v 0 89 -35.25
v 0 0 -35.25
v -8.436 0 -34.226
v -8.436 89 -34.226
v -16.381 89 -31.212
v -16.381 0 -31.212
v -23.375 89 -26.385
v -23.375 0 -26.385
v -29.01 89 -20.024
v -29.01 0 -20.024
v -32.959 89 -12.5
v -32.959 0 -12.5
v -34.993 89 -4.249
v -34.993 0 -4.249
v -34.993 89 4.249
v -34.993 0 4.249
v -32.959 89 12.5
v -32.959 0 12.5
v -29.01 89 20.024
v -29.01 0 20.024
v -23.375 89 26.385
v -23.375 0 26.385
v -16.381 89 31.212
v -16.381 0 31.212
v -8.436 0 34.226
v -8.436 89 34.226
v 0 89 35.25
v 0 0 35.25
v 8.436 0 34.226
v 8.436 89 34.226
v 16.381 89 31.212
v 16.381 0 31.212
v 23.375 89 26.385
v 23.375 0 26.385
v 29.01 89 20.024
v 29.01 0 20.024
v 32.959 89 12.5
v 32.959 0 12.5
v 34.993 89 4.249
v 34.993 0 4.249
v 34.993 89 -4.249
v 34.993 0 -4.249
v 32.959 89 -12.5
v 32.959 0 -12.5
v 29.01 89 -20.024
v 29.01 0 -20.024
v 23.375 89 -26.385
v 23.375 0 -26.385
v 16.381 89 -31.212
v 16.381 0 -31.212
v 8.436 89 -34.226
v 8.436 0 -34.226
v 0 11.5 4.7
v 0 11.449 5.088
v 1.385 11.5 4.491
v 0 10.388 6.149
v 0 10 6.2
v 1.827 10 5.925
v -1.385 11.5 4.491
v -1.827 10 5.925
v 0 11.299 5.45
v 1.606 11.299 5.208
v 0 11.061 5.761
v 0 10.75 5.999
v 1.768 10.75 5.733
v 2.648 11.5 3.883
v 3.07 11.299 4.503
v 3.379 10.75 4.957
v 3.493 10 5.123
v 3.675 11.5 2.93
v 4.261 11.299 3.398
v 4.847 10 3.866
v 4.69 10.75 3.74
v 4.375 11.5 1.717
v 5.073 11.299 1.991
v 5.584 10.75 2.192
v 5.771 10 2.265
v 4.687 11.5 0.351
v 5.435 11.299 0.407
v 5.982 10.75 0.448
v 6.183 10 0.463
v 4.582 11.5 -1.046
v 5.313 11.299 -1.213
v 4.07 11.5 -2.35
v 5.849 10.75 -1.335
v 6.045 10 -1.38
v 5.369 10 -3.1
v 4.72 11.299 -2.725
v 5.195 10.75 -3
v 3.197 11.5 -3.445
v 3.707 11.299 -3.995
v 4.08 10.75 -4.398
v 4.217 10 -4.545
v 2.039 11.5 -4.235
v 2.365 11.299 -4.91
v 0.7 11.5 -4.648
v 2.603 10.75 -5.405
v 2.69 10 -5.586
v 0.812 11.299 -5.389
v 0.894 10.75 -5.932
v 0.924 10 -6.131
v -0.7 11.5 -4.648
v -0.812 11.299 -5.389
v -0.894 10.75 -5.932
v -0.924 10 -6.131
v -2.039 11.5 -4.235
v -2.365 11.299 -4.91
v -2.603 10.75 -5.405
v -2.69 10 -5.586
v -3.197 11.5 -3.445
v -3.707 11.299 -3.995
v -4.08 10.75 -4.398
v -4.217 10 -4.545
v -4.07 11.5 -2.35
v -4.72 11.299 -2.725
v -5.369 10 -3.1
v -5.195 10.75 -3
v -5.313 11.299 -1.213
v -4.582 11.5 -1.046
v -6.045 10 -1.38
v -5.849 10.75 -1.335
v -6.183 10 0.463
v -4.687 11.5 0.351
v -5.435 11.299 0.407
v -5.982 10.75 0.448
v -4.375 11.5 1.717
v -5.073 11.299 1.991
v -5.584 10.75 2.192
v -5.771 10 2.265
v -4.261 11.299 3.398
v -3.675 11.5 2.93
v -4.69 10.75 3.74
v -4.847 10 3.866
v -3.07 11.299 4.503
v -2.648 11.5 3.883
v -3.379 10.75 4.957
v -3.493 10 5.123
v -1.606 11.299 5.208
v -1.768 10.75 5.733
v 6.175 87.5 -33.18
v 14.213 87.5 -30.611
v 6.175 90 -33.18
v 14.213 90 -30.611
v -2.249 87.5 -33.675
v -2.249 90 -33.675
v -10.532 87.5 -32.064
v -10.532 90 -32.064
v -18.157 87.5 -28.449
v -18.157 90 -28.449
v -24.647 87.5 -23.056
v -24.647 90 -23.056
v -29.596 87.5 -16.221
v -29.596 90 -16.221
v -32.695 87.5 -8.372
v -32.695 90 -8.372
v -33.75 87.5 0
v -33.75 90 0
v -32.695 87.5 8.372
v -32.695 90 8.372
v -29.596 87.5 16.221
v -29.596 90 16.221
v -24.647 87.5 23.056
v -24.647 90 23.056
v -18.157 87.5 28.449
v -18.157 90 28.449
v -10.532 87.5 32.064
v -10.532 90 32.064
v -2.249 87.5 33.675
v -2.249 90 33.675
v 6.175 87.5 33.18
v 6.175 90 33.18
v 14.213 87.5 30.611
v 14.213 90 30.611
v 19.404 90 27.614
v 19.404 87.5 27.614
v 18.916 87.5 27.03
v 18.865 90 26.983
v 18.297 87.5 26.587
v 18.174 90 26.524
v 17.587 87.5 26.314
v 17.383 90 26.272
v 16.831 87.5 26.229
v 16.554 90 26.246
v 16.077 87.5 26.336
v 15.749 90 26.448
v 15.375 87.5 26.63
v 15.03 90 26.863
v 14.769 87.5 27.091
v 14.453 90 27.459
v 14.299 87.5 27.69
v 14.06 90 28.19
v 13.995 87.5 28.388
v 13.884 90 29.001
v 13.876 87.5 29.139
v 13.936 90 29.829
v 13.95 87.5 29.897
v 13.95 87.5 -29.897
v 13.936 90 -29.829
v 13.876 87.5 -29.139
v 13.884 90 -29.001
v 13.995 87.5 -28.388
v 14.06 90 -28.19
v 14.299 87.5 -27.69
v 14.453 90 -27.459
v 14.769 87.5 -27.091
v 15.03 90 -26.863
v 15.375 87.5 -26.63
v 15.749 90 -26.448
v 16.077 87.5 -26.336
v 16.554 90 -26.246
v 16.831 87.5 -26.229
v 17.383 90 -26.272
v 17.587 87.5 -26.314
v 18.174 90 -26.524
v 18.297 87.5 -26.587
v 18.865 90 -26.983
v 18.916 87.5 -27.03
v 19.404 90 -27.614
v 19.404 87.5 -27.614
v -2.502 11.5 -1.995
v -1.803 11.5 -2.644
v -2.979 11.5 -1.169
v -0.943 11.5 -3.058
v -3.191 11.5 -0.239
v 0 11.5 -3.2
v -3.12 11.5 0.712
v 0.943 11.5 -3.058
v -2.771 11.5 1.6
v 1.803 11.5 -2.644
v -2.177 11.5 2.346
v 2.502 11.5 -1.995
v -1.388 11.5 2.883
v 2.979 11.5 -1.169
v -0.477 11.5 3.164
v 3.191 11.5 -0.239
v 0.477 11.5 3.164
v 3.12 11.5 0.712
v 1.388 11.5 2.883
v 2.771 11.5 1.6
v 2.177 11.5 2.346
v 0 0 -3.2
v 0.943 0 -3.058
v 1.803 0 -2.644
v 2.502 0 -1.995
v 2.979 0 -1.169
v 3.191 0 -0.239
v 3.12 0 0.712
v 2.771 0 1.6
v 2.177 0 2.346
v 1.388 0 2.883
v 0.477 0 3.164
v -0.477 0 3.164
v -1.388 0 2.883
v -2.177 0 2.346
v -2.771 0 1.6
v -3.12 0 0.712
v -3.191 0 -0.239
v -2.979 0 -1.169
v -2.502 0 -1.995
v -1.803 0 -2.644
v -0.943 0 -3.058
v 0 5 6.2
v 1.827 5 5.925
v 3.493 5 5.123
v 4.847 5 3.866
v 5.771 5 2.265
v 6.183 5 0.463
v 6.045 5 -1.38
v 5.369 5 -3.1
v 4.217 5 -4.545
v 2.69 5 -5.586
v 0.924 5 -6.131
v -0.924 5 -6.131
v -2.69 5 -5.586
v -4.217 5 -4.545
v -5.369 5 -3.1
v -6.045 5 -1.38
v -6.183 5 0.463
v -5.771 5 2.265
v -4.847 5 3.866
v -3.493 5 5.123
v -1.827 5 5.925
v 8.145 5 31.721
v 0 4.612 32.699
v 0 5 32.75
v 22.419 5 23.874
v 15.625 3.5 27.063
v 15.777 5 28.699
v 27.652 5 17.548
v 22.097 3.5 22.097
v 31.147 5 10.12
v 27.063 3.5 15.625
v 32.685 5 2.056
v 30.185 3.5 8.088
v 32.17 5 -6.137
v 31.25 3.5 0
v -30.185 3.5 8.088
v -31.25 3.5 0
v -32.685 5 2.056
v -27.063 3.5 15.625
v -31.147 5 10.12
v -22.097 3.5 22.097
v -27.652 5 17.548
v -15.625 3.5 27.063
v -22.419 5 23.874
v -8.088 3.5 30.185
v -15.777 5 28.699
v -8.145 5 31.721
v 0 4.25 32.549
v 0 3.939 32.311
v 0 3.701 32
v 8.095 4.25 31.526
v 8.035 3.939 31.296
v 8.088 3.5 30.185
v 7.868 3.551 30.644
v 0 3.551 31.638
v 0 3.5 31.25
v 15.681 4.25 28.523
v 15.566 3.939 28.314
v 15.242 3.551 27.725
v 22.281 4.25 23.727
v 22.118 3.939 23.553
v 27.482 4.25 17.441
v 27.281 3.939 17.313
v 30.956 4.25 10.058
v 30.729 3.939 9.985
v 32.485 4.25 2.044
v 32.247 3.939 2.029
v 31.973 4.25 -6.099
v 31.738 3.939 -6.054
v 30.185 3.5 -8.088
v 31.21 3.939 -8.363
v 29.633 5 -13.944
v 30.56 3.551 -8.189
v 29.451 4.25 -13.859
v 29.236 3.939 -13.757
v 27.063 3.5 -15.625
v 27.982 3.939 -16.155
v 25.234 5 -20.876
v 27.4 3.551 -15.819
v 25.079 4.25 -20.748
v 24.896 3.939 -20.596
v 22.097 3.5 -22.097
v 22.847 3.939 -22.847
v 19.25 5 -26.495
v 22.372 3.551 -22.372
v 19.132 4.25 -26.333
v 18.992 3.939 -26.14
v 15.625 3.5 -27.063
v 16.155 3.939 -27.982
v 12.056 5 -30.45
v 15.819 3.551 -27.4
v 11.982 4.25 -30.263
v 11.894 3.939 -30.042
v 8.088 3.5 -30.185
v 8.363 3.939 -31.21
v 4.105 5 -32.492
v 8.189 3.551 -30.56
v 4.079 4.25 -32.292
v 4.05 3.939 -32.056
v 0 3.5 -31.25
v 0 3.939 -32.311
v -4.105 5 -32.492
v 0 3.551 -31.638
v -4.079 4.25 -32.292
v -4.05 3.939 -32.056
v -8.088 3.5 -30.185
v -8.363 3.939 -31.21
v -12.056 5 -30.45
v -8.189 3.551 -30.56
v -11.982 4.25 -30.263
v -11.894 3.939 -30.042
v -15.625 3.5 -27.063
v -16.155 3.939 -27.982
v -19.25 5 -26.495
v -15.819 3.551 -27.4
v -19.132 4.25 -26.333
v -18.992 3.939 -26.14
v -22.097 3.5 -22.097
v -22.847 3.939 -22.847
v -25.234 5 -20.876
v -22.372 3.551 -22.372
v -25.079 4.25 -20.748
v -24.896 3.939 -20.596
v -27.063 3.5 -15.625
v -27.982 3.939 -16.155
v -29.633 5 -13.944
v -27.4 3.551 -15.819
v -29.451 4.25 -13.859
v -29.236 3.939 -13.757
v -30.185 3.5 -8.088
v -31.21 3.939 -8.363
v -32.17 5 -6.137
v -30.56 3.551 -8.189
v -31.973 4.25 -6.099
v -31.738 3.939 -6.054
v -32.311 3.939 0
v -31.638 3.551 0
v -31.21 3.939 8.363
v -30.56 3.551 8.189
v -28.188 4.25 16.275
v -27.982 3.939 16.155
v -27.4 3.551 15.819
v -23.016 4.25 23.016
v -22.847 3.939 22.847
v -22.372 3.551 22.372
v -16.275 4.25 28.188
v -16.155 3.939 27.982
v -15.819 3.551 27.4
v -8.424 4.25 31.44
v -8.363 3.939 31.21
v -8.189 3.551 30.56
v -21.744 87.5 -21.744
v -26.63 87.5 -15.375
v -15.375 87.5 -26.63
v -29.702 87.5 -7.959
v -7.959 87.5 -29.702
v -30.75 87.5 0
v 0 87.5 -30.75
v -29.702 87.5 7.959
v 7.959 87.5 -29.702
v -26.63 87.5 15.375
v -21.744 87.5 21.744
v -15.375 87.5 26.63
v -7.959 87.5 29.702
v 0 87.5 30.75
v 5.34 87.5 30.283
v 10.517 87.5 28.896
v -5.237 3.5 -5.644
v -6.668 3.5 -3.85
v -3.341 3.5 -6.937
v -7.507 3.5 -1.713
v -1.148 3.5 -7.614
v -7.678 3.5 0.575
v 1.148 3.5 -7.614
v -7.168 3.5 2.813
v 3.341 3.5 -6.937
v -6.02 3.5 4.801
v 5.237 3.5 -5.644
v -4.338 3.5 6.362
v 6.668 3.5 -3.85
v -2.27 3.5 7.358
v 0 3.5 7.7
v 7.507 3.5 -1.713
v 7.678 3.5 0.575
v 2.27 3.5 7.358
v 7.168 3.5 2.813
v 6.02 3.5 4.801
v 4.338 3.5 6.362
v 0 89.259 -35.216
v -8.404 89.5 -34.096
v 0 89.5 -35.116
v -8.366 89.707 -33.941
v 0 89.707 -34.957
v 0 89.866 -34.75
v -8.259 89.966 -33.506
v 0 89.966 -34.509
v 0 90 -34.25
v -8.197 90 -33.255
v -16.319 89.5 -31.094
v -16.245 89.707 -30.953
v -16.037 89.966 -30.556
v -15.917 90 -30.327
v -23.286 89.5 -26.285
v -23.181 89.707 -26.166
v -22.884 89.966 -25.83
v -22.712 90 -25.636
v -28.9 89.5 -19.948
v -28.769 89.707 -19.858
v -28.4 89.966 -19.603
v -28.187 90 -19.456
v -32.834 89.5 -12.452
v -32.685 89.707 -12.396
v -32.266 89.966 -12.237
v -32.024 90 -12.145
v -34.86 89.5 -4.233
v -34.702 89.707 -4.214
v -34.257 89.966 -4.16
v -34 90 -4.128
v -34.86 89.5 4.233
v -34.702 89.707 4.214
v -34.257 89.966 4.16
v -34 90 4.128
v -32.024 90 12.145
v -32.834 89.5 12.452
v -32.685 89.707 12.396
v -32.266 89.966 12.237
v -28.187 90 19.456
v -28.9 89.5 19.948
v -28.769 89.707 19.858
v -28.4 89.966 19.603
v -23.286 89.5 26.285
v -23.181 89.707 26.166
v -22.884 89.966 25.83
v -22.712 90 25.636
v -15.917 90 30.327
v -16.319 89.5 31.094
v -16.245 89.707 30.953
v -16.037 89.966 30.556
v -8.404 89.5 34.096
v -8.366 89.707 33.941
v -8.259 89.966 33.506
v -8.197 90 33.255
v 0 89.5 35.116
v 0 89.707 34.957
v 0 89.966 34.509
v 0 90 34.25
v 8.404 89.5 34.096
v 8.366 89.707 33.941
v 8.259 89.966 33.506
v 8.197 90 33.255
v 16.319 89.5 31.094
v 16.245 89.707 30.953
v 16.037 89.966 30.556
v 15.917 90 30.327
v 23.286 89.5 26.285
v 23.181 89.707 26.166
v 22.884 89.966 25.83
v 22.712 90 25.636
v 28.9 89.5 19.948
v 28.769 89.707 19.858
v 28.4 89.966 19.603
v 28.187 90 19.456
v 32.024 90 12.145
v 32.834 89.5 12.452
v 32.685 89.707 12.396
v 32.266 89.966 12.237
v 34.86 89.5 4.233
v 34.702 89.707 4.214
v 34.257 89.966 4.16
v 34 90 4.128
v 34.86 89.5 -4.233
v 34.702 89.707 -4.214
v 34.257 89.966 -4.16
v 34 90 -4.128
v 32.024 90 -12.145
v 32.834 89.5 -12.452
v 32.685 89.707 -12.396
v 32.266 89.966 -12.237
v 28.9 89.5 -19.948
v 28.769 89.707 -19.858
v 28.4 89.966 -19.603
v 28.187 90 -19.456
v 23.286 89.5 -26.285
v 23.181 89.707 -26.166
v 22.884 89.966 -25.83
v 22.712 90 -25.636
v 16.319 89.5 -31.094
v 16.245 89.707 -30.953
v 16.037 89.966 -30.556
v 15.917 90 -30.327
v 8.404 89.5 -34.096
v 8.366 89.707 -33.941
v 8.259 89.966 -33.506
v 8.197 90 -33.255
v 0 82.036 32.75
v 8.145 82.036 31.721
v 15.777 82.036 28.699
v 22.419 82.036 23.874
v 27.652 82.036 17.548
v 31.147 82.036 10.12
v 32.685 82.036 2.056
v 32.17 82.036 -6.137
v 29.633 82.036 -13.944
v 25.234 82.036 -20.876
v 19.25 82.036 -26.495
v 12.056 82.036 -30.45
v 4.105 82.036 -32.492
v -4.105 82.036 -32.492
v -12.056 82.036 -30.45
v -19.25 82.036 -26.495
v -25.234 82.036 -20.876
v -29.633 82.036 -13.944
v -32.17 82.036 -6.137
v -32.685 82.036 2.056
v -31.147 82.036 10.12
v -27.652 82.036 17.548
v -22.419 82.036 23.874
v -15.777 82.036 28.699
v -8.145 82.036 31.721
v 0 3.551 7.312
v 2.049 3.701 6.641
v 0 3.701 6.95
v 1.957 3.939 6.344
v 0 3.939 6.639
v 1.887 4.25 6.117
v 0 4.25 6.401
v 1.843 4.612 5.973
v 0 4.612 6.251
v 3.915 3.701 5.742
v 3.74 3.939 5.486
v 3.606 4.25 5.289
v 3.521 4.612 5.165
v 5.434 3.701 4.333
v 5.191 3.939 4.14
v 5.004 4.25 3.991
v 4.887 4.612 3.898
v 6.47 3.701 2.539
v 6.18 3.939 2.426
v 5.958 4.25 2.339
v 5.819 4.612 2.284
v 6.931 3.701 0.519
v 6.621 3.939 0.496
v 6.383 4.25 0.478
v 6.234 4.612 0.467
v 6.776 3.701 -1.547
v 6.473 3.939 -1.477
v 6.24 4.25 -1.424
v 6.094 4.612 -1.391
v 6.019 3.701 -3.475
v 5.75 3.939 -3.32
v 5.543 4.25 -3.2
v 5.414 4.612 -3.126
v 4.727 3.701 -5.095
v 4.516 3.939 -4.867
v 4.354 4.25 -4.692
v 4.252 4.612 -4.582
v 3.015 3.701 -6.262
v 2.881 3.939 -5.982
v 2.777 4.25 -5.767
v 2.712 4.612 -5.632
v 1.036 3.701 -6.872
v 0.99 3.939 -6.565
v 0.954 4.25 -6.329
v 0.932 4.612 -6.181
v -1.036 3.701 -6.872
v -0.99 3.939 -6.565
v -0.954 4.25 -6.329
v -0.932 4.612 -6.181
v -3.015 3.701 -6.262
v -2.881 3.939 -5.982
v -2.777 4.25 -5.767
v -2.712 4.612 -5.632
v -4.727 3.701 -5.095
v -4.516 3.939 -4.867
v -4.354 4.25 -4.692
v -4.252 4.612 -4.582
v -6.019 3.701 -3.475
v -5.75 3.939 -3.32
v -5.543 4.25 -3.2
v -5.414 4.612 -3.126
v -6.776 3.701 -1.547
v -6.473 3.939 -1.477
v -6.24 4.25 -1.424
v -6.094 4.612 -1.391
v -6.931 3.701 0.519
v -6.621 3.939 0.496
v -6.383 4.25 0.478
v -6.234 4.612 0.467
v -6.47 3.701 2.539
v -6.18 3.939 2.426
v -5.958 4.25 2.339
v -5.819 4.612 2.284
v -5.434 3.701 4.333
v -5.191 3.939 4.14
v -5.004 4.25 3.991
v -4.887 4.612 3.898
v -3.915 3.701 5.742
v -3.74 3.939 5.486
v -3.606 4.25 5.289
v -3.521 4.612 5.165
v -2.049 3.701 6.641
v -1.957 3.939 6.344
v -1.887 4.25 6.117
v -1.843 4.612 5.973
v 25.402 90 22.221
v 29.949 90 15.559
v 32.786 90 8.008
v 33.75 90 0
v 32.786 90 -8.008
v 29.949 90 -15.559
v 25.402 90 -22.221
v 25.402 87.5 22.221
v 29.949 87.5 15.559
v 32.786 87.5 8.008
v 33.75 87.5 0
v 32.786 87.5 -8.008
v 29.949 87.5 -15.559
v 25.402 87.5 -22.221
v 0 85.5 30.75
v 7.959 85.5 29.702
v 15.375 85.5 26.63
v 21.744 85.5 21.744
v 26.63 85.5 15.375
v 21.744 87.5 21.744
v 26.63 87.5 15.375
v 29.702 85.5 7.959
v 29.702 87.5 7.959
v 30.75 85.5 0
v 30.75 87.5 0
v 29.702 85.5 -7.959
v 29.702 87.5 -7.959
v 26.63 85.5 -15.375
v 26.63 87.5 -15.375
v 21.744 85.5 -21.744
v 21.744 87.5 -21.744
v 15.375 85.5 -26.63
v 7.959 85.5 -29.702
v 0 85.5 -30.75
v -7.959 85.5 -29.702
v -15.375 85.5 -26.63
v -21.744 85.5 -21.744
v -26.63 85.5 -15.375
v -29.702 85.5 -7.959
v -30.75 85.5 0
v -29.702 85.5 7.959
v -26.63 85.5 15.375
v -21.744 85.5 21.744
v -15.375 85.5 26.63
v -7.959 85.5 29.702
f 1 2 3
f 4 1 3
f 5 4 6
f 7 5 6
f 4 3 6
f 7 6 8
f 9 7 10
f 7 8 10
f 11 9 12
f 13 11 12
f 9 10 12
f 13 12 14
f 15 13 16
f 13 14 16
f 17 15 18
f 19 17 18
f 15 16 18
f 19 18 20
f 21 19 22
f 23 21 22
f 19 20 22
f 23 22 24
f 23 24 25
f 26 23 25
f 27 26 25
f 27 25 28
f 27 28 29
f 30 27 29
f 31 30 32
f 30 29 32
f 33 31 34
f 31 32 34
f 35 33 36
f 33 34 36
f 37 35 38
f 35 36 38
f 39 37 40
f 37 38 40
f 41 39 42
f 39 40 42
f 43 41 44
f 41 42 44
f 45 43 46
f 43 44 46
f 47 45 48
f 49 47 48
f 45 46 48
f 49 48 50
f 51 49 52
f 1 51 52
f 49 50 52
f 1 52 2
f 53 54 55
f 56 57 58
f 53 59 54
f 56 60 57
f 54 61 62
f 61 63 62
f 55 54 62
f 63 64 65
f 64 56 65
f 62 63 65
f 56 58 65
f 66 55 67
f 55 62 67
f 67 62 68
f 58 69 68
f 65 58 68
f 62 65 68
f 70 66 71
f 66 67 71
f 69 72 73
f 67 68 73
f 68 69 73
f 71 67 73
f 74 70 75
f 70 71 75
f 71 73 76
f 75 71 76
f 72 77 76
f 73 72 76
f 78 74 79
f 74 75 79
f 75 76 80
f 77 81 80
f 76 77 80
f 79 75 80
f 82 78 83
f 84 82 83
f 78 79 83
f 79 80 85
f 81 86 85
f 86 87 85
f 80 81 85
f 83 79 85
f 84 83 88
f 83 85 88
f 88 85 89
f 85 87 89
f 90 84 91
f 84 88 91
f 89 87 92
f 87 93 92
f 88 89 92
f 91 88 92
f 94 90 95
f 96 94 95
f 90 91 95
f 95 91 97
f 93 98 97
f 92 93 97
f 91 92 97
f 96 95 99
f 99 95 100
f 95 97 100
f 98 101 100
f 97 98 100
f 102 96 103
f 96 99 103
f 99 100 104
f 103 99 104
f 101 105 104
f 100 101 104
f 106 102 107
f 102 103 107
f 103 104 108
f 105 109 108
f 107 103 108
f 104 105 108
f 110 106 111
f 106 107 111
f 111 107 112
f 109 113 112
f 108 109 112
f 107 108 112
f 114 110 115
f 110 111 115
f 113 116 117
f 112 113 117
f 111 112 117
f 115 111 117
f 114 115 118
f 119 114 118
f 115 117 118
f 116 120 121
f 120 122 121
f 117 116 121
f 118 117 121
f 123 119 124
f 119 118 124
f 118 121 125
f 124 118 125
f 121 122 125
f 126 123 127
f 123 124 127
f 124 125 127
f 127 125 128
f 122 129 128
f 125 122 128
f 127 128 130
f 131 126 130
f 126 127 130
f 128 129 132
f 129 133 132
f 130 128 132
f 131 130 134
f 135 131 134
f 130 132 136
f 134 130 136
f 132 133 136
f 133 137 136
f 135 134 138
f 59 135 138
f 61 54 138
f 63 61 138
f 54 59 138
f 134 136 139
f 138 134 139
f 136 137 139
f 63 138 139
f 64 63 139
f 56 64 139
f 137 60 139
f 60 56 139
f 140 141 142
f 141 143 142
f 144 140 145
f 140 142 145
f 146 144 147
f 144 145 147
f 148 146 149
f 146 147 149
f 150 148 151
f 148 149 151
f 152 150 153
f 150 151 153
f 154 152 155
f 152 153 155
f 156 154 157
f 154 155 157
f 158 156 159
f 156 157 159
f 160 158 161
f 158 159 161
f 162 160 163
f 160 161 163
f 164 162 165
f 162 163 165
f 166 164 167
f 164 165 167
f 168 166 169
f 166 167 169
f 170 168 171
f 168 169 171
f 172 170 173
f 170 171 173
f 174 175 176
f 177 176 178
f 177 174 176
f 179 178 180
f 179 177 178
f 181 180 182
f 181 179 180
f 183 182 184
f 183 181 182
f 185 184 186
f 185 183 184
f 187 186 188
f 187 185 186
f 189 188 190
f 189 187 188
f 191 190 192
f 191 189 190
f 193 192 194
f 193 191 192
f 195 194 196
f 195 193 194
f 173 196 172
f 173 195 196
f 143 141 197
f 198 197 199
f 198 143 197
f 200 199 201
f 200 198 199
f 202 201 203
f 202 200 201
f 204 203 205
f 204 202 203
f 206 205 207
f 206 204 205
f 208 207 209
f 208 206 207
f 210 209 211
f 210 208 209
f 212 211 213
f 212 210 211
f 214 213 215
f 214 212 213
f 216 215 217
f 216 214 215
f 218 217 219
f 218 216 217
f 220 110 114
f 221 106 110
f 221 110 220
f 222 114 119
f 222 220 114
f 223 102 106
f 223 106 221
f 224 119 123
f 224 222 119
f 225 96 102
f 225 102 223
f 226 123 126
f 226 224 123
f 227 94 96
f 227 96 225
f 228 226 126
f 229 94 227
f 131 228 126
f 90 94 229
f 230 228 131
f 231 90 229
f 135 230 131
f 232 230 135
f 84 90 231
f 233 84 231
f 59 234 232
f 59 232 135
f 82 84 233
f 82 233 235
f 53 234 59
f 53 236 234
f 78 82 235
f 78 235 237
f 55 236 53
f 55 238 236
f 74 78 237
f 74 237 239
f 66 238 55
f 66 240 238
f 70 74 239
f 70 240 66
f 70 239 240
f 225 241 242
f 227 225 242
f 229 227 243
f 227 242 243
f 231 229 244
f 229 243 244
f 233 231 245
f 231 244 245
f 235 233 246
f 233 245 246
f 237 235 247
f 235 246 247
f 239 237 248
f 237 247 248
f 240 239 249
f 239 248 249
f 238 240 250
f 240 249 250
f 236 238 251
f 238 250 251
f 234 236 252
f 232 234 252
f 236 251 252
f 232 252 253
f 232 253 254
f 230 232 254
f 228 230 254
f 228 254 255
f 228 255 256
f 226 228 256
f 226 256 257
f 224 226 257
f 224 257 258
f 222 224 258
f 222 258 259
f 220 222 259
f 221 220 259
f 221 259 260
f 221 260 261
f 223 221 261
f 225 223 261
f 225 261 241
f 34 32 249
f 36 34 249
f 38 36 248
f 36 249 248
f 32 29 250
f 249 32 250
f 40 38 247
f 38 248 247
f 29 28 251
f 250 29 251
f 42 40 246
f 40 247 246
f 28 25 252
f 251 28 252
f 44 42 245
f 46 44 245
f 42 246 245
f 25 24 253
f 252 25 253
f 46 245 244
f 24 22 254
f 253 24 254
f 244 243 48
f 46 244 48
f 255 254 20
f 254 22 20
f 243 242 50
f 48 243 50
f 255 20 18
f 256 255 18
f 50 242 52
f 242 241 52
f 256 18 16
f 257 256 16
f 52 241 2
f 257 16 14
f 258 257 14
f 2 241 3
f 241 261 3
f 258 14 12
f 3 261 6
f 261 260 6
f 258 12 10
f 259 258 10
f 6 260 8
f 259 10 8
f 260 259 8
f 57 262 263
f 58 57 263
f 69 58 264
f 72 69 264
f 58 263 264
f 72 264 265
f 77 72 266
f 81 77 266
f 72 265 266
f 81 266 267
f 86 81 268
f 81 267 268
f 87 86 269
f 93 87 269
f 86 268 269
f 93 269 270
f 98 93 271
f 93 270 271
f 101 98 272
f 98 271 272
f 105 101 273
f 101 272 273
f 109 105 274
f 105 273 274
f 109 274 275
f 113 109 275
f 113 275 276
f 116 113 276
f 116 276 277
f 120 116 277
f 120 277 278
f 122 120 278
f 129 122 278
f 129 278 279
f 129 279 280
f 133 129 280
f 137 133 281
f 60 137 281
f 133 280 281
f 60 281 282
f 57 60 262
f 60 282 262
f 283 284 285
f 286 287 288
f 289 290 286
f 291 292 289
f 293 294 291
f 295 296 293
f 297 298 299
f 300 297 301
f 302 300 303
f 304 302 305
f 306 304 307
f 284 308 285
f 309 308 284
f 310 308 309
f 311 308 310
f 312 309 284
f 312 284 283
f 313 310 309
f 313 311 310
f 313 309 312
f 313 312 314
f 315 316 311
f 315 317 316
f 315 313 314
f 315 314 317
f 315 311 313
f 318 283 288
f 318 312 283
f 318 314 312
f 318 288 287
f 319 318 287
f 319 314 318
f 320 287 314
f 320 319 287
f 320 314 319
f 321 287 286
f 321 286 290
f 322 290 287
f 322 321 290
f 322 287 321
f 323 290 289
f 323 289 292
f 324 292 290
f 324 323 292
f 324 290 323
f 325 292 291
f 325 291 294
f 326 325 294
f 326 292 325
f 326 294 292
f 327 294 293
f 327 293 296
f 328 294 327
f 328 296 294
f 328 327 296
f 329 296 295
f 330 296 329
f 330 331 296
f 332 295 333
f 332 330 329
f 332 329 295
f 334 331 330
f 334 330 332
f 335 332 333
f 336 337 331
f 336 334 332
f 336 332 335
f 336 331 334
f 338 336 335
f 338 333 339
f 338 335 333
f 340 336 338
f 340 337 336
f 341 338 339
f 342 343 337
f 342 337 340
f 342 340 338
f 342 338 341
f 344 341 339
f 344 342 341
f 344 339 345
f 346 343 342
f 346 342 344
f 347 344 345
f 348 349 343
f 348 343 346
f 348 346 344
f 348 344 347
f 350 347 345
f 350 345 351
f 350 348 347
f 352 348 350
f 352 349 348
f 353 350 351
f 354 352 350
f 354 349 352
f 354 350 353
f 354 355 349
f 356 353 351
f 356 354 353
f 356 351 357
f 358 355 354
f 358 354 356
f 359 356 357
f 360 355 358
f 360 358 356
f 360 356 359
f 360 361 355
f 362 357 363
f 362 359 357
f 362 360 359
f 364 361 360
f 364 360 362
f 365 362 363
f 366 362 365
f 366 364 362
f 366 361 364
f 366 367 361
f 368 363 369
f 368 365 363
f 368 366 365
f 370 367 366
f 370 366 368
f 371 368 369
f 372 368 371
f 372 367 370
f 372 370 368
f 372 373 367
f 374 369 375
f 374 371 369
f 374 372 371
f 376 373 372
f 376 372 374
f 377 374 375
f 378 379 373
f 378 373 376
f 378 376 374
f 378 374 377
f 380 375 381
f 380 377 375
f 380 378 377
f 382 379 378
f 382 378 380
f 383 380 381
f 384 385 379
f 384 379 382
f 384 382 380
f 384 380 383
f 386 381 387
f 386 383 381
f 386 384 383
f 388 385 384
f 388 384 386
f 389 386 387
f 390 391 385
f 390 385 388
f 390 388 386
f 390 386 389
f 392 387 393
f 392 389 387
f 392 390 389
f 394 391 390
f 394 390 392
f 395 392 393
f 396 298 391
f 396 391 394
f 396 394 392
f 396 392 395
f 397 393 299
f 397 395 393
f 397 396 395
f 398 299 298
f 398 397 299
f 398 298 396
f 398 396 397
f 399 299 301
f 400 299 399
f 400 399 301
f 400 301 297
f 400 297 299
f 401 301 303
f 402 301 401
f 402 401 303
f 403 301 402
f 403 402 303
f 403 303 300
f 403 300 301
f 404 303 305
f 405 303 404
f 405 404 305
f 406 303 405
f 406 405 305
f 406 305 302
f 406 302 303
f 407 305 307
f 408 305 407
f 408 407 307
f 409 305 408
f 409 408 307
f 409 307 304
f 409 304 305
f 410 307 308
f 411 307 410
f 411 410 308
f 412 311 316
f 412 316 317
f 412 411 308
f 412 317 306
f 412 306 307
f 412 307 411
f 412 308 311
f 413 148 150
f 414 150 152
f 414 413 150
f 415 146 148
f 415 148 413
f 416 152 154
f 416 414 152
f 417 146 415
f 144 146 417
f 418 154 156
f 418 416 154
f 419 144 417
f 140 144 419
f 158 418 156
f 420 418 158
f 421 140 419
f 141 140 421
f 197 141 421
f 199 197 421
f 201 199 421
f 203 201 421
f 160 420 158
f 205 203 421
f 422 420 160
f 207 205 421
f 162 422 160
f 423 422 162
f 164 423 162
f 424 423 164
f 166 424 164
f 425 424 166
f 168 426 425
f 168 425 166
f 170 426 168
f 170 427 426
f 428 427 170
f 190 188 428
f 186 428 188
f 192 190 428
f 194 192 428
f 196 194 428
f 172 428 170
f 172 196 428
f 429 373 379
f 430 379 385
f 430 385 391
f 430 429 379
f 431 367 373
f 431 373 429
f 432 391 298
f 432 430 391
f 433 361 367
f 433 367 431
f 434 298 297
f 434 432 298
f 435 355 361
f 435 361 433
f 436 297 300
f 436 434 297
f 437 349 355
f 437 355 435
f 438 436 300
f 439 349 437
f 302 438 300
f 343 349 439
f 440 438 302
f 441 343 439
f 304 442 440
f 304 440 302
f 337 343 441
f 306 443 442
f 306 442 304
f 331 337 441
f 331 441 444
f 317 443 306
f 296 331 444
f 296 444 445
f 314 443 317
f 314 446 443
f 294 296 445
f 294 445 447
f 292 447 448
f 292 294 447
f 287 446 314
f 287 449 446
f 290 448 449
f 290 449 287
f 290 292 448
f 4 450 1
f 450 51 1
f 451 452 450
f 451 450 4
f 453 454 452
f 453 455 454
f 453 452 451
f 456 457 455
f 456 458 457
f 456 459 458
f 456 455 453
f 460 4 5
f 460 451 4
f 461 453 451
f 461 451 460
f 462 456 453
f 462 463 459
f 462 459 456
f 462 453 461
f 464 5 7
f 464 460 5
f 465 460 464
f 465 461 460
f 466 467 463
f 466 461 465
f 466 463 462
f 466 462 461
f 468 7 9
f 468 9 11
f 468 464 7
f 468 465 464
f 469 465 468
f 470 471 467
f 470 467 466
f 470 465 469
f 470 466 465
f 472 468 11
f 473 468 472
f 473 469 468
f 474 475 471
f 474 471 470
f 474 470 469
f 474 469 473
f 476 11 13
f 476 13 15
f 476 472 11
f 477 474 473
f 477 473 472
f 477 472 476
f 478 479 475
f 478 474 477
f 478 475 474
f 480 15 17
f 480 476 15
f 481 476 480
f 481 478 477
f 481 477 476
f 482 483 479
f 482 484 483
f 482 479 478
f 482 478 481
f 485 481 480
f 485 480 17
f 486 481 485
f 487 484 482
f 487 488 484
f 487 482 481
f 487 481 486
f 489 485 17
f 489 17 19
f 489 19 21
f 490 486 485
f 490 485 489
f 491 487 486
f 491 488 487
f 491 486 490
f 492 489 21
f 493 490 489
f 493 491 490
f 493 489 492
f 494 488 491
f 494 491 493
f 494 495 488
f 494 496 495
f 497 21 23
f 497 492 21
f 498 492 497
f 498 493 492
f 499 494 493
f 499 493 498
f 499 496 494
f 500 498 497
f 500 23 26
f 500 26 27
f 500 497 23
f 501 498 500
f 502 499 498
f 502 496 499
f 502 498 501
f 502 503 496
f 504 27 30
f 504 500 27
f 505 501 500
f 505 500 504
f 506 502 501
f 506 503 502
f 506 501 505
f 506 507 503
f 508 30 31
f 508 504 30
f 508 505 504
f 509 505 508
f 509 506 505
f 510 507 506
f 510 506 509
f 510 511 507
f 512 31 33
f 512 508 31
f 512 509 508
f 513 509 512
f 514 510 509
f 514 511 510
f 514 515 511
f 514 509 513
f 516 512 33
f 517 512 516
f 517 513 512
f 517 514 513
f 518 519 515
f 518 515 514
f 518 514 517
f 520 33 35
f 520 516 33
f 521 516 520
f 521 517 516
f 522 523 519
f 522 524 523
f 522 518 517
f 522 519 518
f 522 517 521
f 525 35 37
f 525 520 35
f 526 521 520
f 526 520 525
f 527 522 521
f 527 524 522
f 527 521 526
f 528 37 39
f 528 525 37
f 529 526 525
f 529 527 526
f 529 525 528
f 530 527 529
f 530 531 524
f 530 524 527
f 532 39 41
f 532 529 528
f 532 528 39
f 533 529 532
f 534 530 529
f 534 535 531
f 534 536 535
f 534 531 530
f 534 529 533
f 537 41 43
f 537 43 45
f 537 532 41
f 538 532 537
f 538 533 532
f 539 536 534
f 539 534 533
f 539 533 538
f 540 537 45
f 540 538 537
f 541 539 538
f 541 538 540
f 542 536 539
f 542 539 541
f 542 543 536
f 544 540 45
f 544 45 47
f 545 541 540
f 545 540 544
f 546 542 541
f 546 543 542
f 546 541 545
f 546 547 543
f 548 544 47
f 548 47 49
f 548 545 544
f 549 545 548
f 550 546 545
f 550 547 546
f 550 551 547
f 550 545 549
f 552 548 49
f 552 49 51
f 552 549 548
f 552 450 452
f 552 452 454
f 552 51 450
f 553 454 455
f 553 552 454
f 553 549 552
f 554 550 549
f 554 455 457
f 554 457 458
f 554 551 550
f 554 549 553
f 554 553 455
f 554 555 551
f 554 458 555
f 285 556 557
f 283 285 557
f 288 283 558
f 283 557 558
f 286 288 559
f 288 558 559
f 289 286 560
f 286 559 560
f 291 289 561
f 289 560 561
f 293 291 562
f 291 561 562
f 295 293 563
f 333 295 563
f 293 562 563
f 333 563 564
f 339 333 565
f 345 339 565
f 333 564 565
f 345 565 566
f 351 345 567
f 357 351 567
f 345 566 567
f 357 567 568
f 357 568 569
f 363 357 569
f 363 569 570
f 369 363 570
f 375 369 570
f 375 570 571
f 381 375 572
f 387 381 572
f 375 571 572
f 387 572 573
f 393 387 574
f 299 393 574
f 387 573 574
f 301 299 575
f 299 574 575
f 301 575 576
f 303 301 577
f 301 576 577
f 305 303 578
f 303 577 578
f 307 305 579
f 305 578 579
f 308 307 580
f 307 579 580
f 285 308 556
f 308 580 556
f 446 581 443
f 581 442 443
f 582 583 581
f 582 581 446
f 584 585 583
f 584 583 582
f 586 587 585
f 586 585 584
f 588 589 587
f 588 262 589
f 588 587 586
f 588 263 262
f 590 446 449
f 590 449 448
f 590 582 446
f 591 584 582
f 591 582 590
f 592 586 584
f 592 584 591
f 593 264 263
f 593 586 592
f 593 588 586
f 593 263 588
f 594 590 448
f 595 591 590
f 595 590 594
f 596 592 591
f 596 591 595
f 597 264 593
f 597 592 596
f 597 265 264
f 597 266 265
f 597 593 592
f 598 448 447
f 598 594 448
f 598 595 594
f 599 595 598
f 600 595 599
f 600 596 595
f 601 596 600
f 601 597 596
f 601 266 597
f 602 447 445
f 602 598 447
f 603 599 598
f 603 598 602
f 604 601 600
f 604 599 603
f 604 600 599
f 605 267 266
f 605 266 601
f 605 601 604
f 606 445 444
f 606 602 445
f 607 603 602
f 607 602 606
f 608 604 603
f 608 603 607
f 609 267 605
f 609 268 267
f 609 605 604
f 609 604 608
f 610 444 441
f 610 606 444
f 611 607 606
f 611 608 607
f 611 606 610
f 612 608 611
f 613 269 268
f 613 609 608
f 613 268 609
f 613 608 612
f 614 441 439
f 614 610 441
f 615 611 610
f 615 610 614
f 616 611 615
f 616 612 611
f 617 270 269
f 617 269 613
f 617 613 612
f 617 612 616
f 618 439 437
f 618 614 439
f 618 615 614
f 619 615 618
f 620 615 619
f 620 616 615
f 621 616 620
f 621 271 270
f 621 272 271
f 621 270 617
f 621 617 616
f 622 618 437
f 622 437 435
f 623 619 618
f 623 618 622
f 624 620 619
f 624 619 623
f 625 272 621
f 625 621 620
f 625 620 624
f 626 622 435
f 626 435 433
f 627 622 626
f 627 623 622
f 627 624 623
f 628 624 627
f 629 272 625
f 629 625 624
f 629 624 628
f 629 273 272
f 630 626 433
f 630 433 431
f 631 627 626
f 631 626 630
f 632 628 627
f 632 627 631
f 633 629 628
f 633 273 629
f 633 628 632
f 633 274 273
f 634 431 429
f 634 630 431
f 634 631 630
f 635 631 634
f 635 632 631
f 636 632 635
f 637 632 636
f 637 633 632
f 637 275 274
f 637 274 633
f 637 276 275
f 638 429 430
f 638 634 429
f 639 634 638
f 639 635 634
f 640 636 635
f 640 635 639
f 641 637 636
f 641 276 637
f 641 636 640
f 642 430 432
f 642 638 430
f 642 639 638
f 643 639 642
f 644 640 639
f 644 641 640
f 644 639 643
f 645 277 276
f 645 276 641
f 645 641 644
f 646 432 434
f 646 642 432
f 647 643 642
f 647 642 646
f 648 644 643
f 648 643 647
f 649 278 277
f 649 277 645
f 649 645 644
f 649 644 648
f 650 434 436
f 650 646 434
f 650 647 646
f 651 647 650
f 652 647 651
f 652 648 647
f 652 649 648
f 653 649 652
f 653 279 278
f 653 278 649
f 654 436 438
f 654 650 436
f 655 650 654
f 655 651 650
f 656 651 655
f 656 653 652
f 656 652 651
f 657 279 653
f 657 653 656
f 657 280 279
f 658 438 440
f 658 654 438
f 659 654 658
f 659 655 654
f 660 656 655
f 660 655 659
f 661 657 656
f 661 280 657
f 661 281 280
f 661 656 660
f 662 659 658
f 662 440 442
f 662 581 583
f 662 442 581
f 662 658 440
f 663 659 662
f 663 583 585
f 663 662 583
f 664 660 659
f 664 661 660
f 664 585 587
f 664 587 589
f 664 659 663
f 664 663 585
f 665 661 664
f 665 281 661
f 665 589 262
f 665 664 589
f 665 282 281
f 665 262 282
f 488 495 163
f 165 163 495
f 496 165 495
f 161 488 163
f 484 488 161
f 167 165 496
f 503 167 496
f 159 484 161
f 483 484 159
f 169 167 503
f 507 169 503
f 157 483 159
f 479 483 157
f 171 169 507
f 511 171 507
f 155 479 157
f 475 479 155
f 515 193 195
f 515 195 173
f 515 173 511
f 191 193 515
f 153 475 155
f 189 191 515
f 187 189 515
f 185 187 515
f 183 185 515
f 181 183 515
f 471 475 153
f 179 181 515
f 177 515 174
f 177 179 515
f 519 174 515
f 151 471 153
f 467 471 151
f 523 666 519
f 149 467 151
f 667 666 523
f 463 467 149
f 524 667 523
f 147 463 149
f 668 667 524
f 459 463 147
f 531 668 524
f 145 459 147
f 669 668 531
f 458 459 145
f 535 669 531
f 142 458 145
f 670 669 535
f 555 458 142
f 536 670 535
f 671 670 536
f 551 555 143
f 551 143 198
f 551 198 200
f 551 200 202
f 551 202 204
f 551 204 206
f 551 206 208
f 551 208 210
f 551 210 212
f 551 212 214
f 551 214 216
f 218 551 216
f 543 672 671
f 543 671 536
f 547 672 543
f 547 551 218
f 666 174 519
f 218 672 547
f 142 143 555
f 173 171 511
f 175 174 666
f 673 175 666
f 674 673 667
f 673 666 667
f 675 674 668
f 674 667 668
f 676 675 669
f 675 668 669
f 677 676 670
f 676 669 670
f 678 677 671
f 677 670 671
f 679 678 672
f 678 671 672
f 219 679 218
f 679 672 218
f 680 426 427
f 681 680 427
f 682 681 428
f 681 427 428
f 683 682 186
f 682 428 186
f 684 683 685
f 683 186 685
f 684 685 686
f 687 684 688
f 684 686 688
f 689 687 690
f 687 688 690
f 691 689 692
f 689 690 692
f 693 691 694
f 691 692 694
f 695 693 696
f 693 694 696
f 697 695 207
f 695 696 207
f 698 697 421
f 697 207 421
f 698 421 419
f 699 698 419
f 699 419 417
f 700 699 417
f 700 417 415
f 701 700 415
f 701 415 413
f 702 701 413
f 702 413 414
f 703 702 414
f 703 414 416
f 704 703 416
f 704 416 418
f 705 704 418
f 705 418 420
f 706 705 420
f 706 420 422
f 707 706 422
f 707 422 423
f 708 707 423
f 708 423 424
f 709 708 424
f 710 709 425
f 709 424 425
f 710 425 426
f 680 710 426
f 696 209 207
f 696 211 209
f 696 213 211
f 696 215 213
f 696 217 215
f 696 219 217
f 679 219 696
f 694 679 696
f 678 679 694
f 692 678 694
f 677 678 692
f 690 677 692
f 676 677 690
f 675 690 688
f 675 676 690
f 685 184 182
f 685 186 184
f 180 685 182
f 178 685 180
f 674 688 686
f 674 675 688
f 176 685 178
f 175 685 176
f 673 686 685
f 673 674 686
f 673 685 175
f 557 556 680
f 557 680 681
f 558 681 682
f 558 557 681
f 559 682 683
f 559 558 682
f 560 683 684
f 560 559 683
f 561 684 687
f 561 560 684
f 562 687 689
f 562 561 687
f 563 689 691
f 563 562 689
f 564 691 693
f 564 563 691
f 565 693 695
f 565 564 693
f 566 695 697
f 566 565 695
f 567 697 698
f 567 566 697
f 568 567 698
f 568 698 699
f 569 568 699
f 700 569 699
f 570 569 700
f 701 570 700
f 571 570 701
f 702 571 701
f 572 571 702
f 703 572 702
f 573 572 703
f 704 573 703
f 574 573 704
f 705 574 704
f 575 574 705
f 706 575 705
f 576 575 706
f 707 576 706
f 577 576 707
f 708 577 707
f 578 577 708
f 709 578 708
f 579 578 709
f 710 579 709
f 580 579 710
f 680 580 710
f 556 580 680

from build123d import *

# Parameters (mm, degrees)
ESQUISSE1_R             = 35.25
BOSS_EXTRU_1_DEPTH      = 90
CONG_1_R                = 1
ESQUISSE4_R             = 33.75
ENL_V_MAT_EXTRU_3_DEPTH = 2.5
ESQUISSE5_R             = 32.75
ENL_V_MAT_EXTRU_4_DEPTH = 84
ESQUISSE6_R             = 33.75
ESQUISSE6_R_2           = 30.75
BOSS_EXTRU_2_DEPTH      = 10
CHANFREIN1_SIZE         = 8
CHANFREIN1_SIZE_2       = 4.618802154
BOSS_EXTRU_3_START      = 2.5
BOSS_EXTRU_3_DEPTH      = 2.5
ESQUISSE8_R             = 6.2
BOSS_EXTRU_4_DEPTH      = 8
ESQUISSE2_R             = 3.2
ENL_V_MAT_EXTRU_1_DEPTH = 103.884036697
CONG_2_R                = 1.5


with BuildPart() as part:
    # Esquisse1 → Boss.-Extru.1 (new body)
    with BuildSketch(Plane(origin=(0, 0, 0), x_dir=(1, 0, 0), z_dir=(0, 1, 0))):
        with Locations(Location((0, 0, 0), (0, 0, 90))):
            Circle(ESQUISSE1_R)
    extrude(amount=BOSS_EXTRU_1_DEPTH)

    # Congé1
    cong_1_edges = [part.edges().sort_by_distance(p)[0] for p in [
        (0, 90, 35.25),
    ]]
    fillet(cong_1_edges, radius=CONG_1_R)

    # Esquisse4 → Enlèv. mat.-Extru.3 (cut)
    with BuildSketch(Plane(origin=(0, 90, 0), x_dir=(1, 0, 0), z_dir=(0, 1, 0))):
        with Locations(Location((0, 0, 0), (0, 0, 270))):
            Circle(ESQUISSE4_R)
    extrude(amount=-ENL_V_MAT_EXTRU_3_DEPTH, mode=Mode.SUBTRACT)

    # Esquisse5 → Enlèv. mat.-Extru.4 (cut)
    with BuildSketch(Plane(origin=(0, 87.5, 0), x_dir=(1, 0, 0), z_dir=(0, 1, 0))):
        with Locations(Location((0, 0, 0), (0, 0, 270))):
            Circle(ESQUISSE5_R)
    extrude(amount=-ENL_V_MAT_EXTRU_4_DEPTH, mode=Mode.SUBTRACT)

    # Esquisse6 → Boss.-Extru.2 (add)
    with BuildSketch(Plane(origin=(0, 87.5, 0), x_dir=(1, 0, 0), z_dir=(0, 1, 0))):
        with Locations(Location((0, 0, 0), (0, 0, 270))):
            Circle(ESQUISSE6_R)
        with Locations(Location((0, 0, 0), (0, 0, 270))):
            Circle(ESQUISSE6_R_2, mode=Mode.SUBTRACT)
    extrude(amount=-BOSS_EXTRU_2_DEPTH)

    # Chanfrein1
    # the kernel refuses this chamfer: 8, 4.618802154 mm, written as the material it takes off along each edge
    with BuildSketch(Plane(origin=(0, 77.5, 0), x_dir=(0, 0, 1), z_dir=(-1, 0, 0))) as chanfrein1_piece_1_section:
        Polygon((30.75, CHANFREIN1_SIZE), (30.75 + CHANFREIN1_SIZE_2, 0), (30.75, 0), align=None)
    chanfrein1_piece_1 = revolve(axis=Axis((0, 77.5, 0), (0, 1, 0)), mode=Mode.PRIVATE)
    chanfrein1_piece_1 = chanfrein1_piece_1 & Plane(origin=(0, 83.835682002, 0), x_dir=(0, 0, 1), z_dir=(0, 1, 0)) * Cylinder(32.75, 142, mode=Mode.PRIVATE)
    add(chanfrein1_piece_1, mode=Mode.SUBTRACT)

    # Esquisse7 → Boss.-Extru.3 (add)
    with BuildSketch(Plane(origin=(0, 87.5, 0), x_dir=(1, 0, 0), z_dir=(0, 1, 0)).offset(BOSS_EXTRU_3_START)):
        with BuildLine():
            ThreePointArc((14.212824392, 30.61140511), (15.375, 26.630281166), (19.403842275, 27.614369538))
            ThreePointArc((19.403842275, 27.614369538), (16.875, 29.228357378), (14.212824392, 30.61140511))
        make_face()
        with BuildLine():
            ThreePointArc((14.212824392, -30.61140511), (16.875, -29.228357378), (19.403842275, -27.614369538))
            ThreePointArc((19.403842275, -27.614369538), (15.375, -26.630281166), (14.212824392, -30.61140511))
        make_face()
    extrude(amount=-BOSS_EXTRU_3_DEPTH)

    # Esquisse8 → Boss.-Extru.4 (add)
    with BuildSketch(Plane(origin=(0, 3.5, 0), x_dir=(1, 0, 0), z_dir=(0, 1, 0))):
        with Locations(Location((0, 0, 0), (0, 0, 270))):
            Circle(ESQUISSE8_R)
    extrude(amount=BOSS_EXTRU_4_DEPTH)

    # Esquisse2 → Enlèv. mat.-Extru.1 (cut, through all)
    with BuildSketch(Plane.XZ):
        with Locations(Location((0, 0, 0), (0, 0, 270))):
            Circle(ESQUISSE2_R)
    extrude(amount=-ENL_V_MAT_EXTRU_1_DEPTH, mode=Mode.SUBTRACT)

    # Congé2
    cong_2_edges = [part.edges().sort_by_distance(p)[0] for p in [
        (0, 3.5, -32.75),
        (0, 3.5, -6.2),
        (0, 11.5, -6.2),
    ]]
    fillet(cong_2_edges, radius=CONG_2_R)


solid = part.part
